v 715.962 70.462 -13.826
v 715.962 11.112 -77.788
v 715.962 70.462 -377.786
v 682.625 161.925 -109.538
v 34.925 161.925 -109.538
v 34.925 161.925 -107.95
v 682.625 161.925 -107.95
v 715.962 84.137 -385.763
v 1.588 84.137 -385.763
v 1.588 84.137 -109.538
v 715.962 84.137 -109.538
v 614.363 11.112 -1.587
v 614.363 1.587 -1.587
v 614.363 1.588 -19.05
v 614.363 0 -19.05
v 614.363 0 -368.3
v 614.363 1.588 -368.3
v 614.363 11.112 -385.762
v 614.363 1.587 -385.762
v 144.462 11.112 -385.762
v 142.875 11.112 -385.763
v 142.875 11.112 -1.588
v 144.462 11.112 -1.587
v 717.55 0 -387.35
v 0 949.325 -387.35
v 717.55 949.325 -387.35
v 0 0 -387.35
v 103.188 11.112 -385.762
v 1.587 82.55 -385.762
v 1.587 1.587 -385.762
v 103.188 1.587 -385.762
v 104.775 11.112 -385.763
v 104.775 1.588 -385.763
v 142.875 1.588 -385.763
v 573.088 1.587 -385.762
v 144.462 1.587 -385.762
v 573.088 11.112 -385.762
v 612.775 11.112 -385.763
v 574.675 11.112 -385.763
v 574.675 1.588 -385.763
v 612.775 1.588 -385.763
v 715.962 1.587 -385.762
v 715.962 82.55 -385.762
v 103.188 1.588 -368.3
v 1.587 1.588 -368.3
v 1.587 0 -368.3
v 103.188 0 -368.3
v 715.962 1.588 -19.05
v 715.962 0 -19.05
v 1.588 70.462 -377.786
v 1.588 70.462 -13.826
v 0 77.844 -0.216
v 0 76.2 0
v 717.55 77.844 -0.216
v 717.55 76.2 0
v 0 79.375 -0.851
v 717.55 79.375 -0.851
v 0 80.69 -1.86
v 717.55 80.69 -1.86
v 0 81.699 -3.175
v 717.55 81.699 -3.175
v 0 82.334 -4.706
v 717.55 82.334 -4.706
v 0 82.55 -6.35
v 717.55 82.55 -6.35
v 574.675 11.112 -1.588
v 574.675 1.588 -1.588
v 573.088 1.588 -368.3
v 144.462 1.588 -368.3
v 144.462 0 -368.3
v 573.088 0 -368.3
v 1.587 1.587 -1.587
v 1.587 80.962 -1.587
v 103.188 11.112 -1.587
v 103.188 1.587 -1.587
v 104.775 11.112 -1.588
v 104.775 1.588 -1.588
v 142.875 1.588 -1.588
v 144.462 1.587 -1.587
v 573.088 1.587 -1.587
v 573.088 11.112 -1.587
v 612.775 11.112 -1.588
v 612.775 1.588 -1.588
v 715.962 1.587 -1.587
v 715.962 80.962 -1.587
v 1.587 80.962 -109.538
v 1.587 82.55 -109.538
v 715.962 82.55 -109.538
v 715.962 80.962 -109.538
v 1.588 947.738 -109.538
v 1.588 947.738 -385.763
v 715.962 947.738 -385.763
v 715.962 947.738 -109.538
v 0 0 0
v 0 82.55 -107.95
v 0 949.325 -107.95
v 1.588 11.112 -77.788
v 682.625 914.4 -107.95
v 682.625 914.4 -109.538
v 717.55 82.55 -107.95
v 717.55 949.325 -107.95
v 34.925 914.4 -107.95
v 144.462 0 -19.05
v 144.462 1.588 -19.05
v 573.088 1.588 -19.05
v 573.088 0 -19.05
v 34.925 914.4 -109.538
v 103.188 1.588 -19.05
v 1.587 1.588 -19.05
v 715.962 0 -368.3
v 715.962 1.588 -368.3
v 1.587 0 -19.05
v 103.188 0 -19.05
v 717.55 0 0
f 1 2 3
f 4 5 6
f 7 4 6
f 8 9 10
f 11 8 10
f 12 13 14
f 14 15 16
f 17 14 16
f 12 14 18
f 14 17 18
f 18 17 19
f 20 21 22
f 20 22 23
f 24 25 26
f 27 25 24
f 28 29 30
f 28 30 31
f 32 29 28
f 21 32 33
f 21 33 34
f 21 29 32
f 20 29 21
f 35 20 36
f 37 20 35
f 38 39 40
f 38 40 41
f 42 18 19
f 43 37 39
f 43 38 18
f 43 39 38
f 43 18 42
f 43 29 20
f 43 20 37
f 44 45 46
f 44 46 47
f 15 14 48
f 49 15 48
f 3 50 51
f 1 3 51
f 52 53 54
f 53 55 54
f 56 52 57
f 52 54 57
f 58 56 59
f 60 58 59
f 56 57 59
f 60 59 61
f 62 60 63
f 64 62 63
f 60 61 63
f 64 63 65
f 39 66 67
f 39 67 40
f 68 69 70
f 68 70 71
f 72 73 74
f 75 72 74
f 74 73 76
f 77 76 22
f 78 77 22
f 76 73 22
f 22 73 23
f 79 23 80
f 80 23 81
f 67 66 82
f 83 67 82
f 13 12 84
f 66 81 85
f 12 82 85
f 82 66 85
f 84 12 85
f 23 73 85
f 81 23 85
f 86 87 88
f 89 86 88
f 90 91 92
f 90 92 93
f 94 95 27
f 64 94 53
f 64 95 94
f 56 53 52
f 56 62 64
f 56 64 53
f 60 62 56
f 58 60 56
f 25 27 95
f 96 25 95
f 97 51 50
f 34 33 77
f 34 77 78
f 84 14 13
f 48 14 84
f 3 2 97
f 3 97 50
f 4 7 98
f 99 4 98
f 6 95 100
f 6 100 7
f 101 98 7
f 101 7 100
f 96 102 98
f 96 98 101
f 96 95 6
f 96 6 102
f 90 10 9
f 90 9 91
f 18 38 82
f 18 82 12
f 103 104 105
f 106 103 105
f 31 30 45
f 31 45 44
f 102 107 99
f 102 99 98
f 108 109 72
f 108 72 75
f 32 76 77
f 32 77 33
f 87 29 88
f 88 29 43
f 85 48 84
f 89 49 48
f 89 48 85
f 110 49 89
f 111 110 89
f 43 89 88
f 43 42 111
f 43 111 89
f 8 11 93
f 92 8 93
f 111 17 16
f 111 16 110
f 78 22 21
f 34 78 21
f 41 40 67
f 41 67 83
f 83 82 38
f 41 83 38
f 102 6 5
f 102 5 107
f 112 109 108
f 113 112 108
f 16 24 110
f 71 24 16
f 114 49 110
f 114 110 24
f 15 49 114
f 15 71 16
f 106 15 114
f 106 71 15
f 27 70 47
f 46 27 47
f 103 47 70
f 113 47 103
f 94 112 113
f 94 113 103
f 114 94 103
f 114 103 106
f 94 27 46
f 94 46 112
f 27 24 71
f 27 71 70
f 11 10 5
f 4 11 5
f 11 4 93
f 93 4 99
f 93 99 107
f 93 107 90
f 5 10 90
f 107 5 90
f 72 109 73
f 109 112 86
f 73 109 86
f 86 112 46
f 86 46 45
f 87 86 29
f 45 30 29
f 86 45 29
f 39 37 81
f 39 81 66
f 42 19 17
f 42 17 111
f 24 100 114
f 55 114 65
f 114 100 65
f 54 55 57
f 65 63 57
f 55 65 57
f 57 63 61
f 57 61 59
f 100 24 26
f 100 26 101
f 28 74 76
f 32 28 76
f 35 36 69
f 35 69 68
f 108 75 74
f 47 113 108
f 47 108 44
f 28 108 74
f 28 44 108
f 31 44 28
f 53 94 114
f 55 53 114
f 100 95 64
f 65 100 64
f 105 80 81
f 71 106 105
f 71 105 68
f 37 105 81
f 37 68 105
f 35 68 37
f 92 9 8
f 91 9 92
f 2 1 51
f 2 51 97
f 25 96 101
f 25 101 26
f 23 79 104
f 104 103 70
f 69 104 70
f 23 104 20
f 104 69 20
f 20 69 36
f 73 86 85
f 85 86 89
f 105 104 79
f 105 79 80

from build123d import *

# Parameters (mm, degrees)
SKETCH1_W           = 279.4
SKETCH1_H           = 866.775
BOSS_EXTRUDE1_DEPTH = 717.55
SHELL2_START        = 1.5875
SHELL2_OUTLINE_W    = 863.6
SHELL2_OUTLINE_H    = 276.225
SHELL2_DEPTH        = 714.375
SHELL2_START_2      = 34.925
SHELL2_2_OUTLINE_W  = 752.475
SHELL2_2_OUTLINE_H  = 1.5875
SHELL2_2_DEPTH      = 647.7
BOSS_EXTRUDE2_DEPTH = 717.55
SHELL3_START        = -385.7625
SHELL3_OUTLINE_W    = 714.375
SHELL3_OUTLINE_H    = 79.375
SHELL3_DEPTH        = 384.175
SHELL3_START_2      = -368.3
SHELL3_2_OUTLINE_W  = 714.375
SHELL3_2_OUTLINE_H  = 1.5875
SHELL3_2_DEPTH      = 258.7625
SHELL3_START_3      = -109.5375
SHELL3_3_OUTLINE_W  = 714.375
SHELL3_3_OUTLINE_H  = 1.5875
SHELL3_3_DEPTH      = 90.4875
SHELL3_4_OUTLINE_W  = 714.375
SHELL3_4_OUTLINE_H  = 1.5875
SHELL3_4_DEPTH      = 17.4625
FILLET1_R           = 6.35
SKETCH6_W           = 41.275
SKETCH6_H           = 387.35
BOSS_EXTRUDE3_DEPTH = 11.1125
SKETCH8_W           = 38.1
SKETCH8_H           = 384.175
CUT_EXTRUDE1_DEPTH  = 9.525
BOSS_EXTRUDE6_REACH = 1252.544


# Read off the part's stored shape, not the designer's step: Shell2, Shell3
with BuildPart() as part:
    # Sketch1 → Boss-Extrude1 (new body)
    with BuildSketch(Plane(origin=(0, 0, 0), x_dir=(0, 0, -1), z_dir=(1, 0, 0))):
        with Locations((247.65, 515.9375)):
            Rectangle(SKETCH1_W, SKETCH1_H)
    extrude(amount=BOSS_EXTRUDE1_DEPTH)

    # Shell2 outline → Shell2 (cut)
    with BuildSketch(Plane.YZ.offset(SHELL2_START)):
        with Locations((515.9375, -247.65)):
            Rectangle(SHELL2_OUTLINE_W, SHELL2_OUTLINE_H)
    extrude(amount=SHELL2_DEPTH, mode=Mode.SUBTRACT)

    # Shell2 2 outline → Shell2 2 (cut)
    with BuildSketch(Plane.YZ.offset(SHELL2_START_2)):
        with Locations((538.1625, -108.74375)):
            Rectangle(SHELL2_2_OUTLINE_W, SHELL2_2_OUTLINE_H)
    extrude(amount=SHELL2_2_DEPTH, mode=Mode.SUBTRACT)

    # Sketch4 → Boss-Extrude2 (add)
    with BuildSketch(Plane(origin=(0, 0, 0), x_dir=(0, 0, -1), z_dir=(1, 0, 0))):
        Polygon((0, 0), (0, 82.55), (107.95, 82.55), (387.35, 82.55), (387.35, 0), align=None)
    extrude(amount=BOSS_EXTRUDE2_DEPTH)

    # Shell3 outline → Shell3 (cut)
    with BuildSketch(Plane.XY.offset(SHELL3_START)):
        with Locations((358.775, 41.275)):
            Rectangle(SHELL3_OUTLINE_W, SHELL3_OUTLINE_H)
    extrude(amount=SHELL3_DEPTH, mode=Mode.SUBTRACT)

    # Shell3 2 outline → Shell3 2 (cut)
    with BuildSketch(Plane.XY.offset(SHELL3_START_2)):
        with Locations((358.775, 0.79375)):
            Rectangle(SHELL3_2_OUTLINE_W, SHELL3_2_OUTLINE_H)
        with Locations((358.775, 81.75625)):
            Rectangle(SHELL3_2_OUTLINE_W, SHELL3_2_OUTLINE_H)
    extrude(amount=SHELL3_2_DEPTH, mode=Mode.SUBTRACT)

    # Shell3 3 outline → Shell3 3 (cut)
    with BuildSketch(Plane.XY.offset(SHELL3_START_3)):
        with Locations((358.775, 0.79375)):
            Rectangle(SHELL3_3_OUTLINE_W, SHELL3_3_OUTLINE_H)
    extrude(amount=SHELL3_3_DEPTH, mode=Mode.SUBTRACT)

    # Shell3 4 outline → Shell3 4 (cut)
    with BuildSketch(Plane.XY.offset(SHELL3_START)):
        with Locations((358.775, 81.75625)):
            Rectangle(SHELL3_4_OUTLINE_W, SHELL3_4_OUTLINE_H)
    extrude(amount=SHELL3_4_DEPTH, mode=Mode.SUBTRACT)

    # Fillet1
    fillet1_edges = [part.edges().sort_by_distance(p)[0] for p in [
        (358.775, 82.55, 0),
    ]]
    fillet(fillet1_edges, radius=FILLET1_R)

    # Sketch6 → Boss-Extrude3 (add)
    with BuildSketch(Plane(origin=(0, 0, 0), x_dir=(1, 0, 0), z_dir=(0, 1, 0))):
        with Locations((123.825, 193.675)):
            Rectangle(SKETCH6_W, SKETCH6_H)
        with Locations((593.725, 193.675)):
            Rectangle(SKETCH6_W, SKETCH6_H)
    extrude(amount=BOSS_EXTRUDE3_DEPTH)

    # Sketch8 → Cut-Extrude1 (cut)
    with BuildSketch(Plane(origin=(0, 11.1125, 0), x_dir=(1, 0, 0), z_dir=(0, 1, 0))):
        with Locations((123.825, 193.675)):
            Rectangle(SKETCH8_W, SKETCH8_H)
        with Locations((593.725, 193.675)):
            Rectangle(SKETCH8_W, SKETCH8_H)
    extrude(amount=-CUT_EXTRUDE1_DEPTH, mode=Mode.SUBTRACT)


with BuildPart() as body_2:

    # Sketch9 → Boss-Extrude6 (new, up to next)
    with BuildSketch(Plane(origin=(1.5875, 0, 0), x_dir=(0, 0, -1), z_dir=(1, 0, 0)), mode=Mode.PRIVATE) as boss_extrude6_sk1:
        Polygon((13.825638806, 70.461659548), (77.7875, 11.1125), (377.786099377, 70.461659548), align=None)
    boss_extrude6_tool1 = extrude(boss_extrude6_sk1.sketch, amount=BOSS_EXTRUDE6_REACH, mode=Mode.PRIVATE) - part.part
    add(boss_extrude6_tool1.solids().sort_by_distance((1.5875, 50.678606, -156.466413))[0])


solid = Compound([part.part, body_2.part])
